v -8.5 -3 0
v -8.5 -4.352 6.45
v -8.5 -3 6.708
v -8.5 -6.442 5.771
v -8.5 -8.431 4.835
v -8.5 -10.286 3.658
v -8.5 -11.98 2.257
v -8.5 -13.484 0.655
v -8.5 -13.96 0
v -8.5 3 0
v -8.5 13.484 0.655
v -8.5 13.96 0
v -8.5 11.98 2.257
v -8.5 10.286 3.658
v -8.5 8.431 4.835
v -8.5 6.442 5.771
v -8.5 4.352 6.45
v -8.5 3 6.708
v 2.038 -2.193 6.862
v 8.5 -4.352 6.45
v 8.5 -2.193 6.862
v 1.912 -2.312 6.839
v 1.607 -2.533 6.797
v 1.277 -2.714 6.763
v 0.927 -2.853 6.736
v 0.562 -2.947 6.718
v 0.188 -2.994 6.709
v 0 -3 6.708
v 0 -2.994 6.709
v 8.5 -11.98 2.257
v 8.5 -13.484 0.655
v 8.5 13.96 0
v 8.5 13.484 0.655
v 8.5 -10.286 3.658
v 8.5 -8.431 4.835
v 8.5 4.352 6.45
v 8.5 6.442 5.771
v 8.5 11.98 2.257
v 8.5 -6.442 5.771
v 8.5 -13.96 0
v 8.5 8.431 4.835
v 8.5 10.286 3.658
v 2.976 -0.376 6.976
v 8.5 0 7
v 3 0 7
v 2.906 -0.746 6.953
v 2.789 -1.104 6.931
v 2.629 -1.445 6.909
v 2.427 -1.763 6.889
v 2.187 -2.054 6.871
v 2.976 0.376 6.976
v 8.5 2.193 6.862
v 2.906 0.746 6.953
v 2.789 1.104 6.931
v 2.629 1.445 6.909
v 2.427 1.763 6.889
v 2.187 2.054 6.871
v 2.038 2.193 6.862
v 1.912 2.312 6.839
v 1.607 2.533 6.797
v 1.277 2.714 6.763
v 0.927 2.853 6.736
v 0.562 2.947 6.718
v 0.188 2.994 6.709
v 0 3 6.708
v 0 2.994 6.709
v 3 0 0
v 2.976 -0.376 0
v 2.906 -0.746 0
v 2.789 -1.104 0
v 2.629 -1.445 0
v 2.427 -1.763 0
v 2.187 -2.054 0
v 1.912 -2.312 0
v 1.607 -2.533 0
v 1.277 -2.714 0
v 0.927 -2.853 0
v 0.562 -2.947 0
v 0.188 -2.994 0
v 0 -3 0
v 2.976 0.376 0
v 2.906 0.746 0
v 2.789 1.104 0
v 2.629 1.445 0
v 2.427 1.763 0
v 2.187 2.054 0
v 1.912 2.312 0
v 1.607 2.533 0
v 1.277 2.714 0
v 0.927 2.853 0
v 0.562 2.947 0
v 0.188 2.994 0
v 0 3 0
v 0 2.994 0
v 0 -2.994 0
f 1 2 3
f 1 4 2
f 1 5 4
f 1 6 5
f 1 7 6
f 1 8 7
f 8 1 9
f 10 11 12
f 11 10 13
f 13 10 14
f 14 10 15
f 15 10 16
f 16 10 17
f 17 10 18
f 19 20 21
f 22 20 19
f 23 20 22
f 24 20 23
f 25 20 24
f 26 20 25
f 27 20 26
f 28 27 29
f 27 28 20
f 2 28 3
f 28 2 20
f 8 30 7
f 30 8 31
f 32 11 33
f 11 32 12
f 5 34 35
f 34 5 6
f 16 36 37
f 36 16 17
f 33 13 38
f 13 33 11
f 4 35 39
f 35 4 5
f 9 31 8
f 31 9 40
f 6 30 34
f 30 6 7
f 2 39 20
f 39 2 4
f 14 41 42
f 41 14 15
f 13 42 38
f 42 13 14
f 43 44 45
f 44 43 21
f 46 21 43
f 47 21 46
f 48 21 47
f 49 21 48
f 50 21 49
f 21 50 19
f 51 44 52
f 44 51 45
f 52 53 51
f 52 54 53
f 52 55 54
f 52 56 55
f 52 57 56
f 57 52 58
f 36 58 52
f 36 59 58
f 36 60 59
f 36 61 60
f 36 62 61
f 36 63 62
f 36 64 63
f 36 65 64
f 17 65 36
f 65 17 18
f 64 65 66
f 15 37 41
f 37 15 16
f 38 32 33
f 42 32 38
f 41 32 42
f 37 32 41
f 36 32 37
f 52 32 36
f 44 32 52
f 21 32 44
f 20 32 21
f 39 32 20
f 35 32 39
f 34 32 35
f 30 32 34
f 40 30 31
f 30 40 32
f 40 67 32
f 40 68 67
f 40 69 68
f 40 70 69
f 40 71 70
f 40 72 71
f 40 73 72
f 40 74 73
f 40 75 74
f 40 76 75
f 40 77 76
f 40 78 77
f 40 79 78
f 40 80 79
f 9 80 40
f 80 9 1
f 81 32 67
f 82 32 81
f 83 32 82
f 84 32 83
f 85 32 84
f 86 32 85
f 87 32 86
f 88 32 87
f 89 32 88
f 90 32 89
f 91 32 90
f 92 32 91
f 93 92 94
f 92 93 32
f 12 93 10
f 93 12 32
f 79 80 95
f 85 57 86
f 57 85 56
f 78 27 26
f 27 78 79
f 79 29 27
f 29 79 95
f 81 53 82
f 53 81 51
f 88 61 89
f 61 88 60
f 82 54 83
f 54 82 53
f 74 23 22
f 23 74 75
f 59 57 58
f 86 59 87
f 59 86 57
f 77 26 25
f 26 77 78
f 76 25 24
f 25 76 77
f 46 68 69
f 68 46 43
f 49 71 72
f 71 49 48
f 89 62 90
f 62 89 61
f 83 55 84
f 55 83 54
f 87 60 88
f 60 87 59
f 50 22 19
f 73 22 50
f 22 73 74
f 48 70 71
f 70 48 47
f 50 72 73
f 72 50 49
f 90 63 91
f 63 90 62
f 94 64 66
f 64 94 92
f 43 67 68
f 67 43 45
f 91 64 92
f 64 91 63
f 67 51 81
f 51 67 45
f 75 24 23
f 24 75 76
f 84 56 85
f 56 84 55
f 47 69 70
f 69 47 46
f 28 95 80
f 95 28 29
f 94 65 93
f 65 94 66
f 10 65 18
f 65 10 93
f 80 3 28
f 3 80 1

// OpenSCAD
radius = 17.5;
width = 17;
bolt_dia = 6;

arc_thickness = 7;

$fn = 50;

translate([0,0, -(radius - arc_thickness)])
rotate(a = 90, v = [0,1,0])
difference() {
    {
        // base cylinder
        cylinder (r = radius, h = width, center = true);
    }

    {
        // cube to make the cylinder a 3D chord
        translate([arc_thickness,0,0])
        cube([radius * 2, radius * 2,  width], center = true);
        
        // bolt hole
        rotate(a = 90, v=[0,1,0])
        cylinder(r = bolt_dia/2, h = radius * 2, center = true); 
        
        // entry slot
        translate([0,0,-width/4])
        # cube([radius * 2, bolt_dia, width/2], center = true);
    }
}
